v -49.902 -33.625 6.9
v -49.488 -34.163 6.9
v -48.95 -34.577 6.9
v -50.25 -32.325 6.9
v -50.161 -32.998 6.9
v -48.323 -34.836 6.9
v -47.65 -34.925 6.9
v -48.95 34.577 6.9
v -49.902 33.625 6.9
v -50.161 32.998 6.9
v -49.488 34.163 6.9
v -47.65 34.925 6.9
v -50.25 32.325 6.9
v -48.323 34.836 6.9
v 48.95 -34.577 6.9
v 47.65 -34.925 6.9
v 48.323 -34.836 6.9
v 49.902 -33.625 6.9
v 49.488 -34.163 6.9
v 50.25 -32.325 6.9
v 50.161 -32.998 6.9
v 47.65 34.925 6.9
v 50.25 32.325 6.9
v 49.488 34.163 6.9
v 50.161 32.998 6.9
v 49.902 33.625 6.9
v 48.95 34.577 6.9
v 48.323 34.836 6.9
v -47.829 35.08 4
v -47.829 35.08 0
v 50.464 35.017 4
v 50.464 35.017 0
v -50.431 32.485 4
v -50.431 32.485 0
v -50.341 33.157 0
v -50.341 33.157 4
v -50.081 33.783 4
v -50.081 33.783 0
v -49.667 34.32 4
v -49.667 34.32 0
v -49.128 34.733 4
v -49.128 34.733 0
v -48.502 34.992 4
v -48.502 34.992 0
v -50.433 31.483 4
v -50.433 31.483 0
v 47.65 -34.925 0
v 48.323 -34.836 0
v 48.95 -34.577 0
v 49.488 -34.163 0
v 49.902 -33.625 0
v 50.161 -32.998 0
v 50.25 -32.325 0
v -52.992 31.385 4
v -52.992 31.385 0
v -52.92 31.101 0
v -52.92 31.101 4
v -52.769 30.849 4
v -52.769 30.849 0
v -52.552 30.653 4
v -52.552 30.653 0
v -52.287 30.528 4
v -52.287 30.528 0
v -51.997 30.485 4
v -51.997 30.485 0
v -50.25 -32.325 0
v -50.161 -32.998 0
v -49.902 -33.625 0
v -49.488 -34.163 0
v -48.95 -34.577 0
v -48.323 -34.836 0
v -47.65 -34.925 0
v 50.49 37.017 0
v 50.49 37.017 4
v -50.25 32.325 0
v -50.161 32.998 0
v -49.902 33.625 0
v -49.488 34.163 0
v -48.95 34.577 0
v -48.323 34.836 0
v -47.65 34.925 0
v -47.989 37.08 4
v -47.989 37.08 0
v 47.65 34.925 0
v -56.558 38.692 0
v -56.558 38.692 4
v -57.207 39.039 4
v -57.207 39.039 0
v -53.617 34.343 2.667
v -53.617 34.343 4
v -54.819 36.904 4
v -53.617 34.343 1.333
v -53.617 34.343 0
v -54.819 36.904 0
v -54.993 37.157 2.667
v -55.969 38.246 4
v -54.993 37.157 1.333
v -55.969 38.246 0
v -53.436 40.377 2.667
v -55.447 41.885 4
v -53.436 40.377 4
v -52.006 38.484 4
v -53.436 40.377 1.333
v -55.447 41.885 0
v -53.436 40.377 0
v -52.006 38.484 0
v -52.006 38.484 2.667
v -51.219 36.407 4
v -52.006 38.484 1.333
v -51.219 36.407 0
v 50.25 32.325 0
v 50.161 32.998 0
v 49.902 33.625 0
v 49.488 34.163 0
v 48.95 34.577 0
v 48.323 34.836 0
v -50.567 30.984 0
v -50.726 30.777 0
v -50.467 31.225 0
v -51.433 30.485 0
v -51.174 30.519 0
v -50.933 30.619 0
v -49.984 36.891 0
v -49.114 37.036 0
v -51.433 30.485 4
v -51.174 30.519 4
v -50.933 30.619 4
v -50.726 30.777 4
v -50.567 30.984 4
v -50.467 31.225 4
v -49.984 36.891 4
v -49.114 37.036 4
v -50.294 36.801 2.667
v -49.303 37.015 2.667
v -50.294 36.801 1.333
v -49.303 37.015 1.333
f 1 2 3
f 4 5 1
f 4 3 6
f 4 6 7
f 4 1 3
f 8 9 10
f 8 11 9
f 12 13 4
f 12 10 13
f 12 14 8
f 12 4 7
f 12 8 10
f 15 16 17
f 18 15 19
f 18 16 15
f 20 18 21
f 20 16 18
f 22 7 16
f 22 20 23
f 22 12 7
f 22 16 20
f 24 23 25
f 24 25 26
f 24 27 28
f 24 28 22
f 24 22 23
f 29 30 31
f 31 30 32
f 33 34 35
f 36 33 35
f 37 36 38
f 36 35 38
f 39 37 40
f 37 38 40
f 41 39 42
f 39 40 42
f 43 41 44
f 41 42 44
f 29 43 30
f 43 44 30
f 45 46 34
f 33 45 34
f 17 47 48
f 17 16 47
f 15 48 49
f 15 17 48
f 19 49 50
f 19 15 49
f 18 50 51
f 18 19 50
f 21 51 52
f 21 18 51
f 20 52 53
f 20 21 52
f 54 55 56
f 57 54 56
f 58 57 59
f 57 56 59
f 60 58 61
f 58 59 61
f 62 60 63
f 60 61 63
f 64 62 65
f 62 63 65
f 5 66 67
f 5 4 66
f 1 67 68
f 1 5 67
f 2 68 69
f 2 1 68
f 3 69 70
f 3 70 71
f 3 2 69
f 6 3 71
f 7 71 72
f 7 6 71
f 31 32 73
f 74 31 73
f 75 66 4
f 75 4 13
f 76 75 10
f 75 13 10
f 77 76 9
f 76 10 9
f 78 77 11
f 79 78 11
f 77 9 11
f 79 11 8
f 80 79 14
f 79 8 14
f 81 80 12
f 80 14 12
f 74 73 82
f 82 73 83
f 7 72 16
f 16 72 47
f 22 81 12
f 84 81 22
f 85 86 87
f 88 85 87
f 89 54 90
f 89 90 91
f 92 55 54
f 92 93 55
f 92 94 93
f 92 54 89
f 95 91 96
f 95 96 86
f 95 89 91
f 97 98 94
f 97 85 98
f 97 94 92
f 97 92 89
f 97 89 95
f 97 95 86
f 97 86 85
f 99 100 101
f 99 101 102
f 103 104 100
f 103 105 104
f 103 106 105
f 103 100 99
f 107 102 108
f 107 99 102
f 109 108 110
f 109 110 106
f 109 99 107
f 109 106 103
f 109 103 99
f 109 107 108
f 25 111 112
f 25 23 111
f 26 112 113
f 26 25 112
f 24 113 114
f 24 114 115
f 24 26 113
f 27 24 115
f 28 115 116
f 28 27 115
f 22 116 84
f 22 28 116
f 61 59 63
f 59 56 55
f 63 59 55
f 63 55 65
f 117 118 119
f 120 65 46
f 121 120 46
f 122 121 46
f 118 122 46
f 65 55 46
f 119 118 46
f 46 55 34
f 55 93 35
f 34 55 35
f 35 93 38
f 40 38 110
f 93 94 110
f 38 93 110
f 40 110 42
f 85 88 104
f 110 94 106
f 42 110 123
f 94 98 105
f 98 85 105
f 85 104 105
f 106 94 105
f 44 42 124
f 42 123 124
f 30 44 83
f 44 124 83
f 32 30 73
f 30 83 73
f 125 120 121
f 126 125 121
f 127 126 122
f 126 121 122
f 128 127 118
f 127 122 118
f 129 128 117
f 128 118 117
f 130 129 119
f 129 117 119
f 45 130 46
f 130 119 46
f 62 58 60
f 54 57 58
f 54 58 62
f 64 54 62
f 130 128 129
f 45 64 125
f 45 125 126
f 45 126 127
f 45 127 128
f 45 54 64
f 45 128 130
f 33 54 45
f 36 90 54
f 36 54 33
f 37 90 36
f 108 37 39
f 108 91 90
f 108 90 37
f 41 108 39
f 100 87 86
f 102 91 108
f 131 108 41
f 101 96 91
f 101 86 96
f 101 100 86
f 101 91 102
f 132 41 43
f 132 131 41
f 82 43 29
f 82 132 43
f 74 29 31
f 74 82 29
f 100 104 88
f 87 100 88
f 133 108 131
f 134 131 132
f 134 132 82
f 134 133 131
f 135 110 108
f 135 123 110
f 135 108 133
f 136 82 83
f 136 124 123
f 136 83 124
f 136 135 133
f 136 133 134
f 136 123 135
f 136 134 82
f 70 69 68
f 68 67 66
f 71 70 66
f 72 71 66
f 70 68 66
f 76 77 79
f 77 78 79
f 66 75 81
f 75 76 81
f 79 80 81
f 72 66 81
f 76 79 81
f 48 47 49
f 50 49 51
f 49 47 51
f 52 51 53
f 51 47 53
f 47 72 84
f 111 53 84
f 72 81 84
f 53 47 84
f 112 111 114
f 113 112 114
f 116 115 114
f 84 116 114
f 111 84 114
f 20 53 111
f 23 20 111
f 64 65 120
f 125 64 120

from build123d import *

# Parameters (mm, degrees)
F0_W     = 100.5
F0_H     = 69.85
F1_DEPTH = 6.9
F2_R     = 2.6
F4_DEPTH = 4


with BuildPart() as f1:
    # F0 (on Top) → F1 (new body)
    with BuildSketch(Plane.XY):
        Rectangle(F0_W, F0_H)
    extrude(amount=F1_DEPTH)

    # F2
    f2_edges = [f1.edges().sort_by_distance(p)[0] for p in [
        (50.25, 34.925, 3.45),
        (-50.25, 34.925, 3.45),
        (50.25, -34.925, 3.45),
        (-50.25, -34.925, 3.45),
    ]]
    fillet(f2_edges, radius=F2_R)


with BuildPart() as f4:
    # F3 (on Top) → F4 (new body)
    with BuildSketch(Plane.XY):
        with BuildLine():
            Line((-51.996715, 30.484922), (-51.432752, 30.484922))
            ThreePointArc((-51.432752, 30.484922), (-50.726335, 30.777126), (-50.432754, 31.482971))
            Line((-50.432754, 31.482971), (-50.4308, 32.484696))
            ThreePointArc((-50.4308, 32.484696), (-49.666903, 34.320477), (-47.829152, 35.079623))
            Line((-47.829152, 35.079623), (50.463868, 35.017145))
            Line((50.463868, 35.017145), (50.48959, 37.017129))
            Line((50.48959, 37.017129), (-47.989413, 37.079725))
            add(Edge.make_bspline(
                [(-51.218937, 36.40709), (-50.241545, 36.901925), (-49.550101, 37.079725), (-47.989413, 37.079725)],
                knots=[0, 0, 0, 0, 3.298828, 3.298828, 3.298828, 3.298828], degree=3))
            add(Edge.make_bspline(
                [(-55.447294, 41.885467), (-53.165365, 40.635724), (-51.663946, 38.508711), (-51.218937, 36.40709)],
                knots=[0, 0, 0, 0, 6.920377, 6.920377, 6.920377, 6.920377], degree=3))
            Line((-55.447294, 41.885467), (-57.206698, 39.039075))
            add(Edge.make_bspline(
                [(-52.991679, 31.384692), (-53.270413, 34.151609), (-54.545485, 37.885883), (-57.206698, 39.039075)],
                knots=[0.974831, 0.974831, 0.974831, 0.974831, 9.561563, 9.561563, 9.561563, 9.561563], degree=3))
            ThreePointArc((-52.991679, 31.384692), (-52.66745, 30.743225), (-51.996715, 30.484922))
        make_face()
    extrude(amount=F4_DEPTH)


solid = Compound([f1.part, f4.part])
